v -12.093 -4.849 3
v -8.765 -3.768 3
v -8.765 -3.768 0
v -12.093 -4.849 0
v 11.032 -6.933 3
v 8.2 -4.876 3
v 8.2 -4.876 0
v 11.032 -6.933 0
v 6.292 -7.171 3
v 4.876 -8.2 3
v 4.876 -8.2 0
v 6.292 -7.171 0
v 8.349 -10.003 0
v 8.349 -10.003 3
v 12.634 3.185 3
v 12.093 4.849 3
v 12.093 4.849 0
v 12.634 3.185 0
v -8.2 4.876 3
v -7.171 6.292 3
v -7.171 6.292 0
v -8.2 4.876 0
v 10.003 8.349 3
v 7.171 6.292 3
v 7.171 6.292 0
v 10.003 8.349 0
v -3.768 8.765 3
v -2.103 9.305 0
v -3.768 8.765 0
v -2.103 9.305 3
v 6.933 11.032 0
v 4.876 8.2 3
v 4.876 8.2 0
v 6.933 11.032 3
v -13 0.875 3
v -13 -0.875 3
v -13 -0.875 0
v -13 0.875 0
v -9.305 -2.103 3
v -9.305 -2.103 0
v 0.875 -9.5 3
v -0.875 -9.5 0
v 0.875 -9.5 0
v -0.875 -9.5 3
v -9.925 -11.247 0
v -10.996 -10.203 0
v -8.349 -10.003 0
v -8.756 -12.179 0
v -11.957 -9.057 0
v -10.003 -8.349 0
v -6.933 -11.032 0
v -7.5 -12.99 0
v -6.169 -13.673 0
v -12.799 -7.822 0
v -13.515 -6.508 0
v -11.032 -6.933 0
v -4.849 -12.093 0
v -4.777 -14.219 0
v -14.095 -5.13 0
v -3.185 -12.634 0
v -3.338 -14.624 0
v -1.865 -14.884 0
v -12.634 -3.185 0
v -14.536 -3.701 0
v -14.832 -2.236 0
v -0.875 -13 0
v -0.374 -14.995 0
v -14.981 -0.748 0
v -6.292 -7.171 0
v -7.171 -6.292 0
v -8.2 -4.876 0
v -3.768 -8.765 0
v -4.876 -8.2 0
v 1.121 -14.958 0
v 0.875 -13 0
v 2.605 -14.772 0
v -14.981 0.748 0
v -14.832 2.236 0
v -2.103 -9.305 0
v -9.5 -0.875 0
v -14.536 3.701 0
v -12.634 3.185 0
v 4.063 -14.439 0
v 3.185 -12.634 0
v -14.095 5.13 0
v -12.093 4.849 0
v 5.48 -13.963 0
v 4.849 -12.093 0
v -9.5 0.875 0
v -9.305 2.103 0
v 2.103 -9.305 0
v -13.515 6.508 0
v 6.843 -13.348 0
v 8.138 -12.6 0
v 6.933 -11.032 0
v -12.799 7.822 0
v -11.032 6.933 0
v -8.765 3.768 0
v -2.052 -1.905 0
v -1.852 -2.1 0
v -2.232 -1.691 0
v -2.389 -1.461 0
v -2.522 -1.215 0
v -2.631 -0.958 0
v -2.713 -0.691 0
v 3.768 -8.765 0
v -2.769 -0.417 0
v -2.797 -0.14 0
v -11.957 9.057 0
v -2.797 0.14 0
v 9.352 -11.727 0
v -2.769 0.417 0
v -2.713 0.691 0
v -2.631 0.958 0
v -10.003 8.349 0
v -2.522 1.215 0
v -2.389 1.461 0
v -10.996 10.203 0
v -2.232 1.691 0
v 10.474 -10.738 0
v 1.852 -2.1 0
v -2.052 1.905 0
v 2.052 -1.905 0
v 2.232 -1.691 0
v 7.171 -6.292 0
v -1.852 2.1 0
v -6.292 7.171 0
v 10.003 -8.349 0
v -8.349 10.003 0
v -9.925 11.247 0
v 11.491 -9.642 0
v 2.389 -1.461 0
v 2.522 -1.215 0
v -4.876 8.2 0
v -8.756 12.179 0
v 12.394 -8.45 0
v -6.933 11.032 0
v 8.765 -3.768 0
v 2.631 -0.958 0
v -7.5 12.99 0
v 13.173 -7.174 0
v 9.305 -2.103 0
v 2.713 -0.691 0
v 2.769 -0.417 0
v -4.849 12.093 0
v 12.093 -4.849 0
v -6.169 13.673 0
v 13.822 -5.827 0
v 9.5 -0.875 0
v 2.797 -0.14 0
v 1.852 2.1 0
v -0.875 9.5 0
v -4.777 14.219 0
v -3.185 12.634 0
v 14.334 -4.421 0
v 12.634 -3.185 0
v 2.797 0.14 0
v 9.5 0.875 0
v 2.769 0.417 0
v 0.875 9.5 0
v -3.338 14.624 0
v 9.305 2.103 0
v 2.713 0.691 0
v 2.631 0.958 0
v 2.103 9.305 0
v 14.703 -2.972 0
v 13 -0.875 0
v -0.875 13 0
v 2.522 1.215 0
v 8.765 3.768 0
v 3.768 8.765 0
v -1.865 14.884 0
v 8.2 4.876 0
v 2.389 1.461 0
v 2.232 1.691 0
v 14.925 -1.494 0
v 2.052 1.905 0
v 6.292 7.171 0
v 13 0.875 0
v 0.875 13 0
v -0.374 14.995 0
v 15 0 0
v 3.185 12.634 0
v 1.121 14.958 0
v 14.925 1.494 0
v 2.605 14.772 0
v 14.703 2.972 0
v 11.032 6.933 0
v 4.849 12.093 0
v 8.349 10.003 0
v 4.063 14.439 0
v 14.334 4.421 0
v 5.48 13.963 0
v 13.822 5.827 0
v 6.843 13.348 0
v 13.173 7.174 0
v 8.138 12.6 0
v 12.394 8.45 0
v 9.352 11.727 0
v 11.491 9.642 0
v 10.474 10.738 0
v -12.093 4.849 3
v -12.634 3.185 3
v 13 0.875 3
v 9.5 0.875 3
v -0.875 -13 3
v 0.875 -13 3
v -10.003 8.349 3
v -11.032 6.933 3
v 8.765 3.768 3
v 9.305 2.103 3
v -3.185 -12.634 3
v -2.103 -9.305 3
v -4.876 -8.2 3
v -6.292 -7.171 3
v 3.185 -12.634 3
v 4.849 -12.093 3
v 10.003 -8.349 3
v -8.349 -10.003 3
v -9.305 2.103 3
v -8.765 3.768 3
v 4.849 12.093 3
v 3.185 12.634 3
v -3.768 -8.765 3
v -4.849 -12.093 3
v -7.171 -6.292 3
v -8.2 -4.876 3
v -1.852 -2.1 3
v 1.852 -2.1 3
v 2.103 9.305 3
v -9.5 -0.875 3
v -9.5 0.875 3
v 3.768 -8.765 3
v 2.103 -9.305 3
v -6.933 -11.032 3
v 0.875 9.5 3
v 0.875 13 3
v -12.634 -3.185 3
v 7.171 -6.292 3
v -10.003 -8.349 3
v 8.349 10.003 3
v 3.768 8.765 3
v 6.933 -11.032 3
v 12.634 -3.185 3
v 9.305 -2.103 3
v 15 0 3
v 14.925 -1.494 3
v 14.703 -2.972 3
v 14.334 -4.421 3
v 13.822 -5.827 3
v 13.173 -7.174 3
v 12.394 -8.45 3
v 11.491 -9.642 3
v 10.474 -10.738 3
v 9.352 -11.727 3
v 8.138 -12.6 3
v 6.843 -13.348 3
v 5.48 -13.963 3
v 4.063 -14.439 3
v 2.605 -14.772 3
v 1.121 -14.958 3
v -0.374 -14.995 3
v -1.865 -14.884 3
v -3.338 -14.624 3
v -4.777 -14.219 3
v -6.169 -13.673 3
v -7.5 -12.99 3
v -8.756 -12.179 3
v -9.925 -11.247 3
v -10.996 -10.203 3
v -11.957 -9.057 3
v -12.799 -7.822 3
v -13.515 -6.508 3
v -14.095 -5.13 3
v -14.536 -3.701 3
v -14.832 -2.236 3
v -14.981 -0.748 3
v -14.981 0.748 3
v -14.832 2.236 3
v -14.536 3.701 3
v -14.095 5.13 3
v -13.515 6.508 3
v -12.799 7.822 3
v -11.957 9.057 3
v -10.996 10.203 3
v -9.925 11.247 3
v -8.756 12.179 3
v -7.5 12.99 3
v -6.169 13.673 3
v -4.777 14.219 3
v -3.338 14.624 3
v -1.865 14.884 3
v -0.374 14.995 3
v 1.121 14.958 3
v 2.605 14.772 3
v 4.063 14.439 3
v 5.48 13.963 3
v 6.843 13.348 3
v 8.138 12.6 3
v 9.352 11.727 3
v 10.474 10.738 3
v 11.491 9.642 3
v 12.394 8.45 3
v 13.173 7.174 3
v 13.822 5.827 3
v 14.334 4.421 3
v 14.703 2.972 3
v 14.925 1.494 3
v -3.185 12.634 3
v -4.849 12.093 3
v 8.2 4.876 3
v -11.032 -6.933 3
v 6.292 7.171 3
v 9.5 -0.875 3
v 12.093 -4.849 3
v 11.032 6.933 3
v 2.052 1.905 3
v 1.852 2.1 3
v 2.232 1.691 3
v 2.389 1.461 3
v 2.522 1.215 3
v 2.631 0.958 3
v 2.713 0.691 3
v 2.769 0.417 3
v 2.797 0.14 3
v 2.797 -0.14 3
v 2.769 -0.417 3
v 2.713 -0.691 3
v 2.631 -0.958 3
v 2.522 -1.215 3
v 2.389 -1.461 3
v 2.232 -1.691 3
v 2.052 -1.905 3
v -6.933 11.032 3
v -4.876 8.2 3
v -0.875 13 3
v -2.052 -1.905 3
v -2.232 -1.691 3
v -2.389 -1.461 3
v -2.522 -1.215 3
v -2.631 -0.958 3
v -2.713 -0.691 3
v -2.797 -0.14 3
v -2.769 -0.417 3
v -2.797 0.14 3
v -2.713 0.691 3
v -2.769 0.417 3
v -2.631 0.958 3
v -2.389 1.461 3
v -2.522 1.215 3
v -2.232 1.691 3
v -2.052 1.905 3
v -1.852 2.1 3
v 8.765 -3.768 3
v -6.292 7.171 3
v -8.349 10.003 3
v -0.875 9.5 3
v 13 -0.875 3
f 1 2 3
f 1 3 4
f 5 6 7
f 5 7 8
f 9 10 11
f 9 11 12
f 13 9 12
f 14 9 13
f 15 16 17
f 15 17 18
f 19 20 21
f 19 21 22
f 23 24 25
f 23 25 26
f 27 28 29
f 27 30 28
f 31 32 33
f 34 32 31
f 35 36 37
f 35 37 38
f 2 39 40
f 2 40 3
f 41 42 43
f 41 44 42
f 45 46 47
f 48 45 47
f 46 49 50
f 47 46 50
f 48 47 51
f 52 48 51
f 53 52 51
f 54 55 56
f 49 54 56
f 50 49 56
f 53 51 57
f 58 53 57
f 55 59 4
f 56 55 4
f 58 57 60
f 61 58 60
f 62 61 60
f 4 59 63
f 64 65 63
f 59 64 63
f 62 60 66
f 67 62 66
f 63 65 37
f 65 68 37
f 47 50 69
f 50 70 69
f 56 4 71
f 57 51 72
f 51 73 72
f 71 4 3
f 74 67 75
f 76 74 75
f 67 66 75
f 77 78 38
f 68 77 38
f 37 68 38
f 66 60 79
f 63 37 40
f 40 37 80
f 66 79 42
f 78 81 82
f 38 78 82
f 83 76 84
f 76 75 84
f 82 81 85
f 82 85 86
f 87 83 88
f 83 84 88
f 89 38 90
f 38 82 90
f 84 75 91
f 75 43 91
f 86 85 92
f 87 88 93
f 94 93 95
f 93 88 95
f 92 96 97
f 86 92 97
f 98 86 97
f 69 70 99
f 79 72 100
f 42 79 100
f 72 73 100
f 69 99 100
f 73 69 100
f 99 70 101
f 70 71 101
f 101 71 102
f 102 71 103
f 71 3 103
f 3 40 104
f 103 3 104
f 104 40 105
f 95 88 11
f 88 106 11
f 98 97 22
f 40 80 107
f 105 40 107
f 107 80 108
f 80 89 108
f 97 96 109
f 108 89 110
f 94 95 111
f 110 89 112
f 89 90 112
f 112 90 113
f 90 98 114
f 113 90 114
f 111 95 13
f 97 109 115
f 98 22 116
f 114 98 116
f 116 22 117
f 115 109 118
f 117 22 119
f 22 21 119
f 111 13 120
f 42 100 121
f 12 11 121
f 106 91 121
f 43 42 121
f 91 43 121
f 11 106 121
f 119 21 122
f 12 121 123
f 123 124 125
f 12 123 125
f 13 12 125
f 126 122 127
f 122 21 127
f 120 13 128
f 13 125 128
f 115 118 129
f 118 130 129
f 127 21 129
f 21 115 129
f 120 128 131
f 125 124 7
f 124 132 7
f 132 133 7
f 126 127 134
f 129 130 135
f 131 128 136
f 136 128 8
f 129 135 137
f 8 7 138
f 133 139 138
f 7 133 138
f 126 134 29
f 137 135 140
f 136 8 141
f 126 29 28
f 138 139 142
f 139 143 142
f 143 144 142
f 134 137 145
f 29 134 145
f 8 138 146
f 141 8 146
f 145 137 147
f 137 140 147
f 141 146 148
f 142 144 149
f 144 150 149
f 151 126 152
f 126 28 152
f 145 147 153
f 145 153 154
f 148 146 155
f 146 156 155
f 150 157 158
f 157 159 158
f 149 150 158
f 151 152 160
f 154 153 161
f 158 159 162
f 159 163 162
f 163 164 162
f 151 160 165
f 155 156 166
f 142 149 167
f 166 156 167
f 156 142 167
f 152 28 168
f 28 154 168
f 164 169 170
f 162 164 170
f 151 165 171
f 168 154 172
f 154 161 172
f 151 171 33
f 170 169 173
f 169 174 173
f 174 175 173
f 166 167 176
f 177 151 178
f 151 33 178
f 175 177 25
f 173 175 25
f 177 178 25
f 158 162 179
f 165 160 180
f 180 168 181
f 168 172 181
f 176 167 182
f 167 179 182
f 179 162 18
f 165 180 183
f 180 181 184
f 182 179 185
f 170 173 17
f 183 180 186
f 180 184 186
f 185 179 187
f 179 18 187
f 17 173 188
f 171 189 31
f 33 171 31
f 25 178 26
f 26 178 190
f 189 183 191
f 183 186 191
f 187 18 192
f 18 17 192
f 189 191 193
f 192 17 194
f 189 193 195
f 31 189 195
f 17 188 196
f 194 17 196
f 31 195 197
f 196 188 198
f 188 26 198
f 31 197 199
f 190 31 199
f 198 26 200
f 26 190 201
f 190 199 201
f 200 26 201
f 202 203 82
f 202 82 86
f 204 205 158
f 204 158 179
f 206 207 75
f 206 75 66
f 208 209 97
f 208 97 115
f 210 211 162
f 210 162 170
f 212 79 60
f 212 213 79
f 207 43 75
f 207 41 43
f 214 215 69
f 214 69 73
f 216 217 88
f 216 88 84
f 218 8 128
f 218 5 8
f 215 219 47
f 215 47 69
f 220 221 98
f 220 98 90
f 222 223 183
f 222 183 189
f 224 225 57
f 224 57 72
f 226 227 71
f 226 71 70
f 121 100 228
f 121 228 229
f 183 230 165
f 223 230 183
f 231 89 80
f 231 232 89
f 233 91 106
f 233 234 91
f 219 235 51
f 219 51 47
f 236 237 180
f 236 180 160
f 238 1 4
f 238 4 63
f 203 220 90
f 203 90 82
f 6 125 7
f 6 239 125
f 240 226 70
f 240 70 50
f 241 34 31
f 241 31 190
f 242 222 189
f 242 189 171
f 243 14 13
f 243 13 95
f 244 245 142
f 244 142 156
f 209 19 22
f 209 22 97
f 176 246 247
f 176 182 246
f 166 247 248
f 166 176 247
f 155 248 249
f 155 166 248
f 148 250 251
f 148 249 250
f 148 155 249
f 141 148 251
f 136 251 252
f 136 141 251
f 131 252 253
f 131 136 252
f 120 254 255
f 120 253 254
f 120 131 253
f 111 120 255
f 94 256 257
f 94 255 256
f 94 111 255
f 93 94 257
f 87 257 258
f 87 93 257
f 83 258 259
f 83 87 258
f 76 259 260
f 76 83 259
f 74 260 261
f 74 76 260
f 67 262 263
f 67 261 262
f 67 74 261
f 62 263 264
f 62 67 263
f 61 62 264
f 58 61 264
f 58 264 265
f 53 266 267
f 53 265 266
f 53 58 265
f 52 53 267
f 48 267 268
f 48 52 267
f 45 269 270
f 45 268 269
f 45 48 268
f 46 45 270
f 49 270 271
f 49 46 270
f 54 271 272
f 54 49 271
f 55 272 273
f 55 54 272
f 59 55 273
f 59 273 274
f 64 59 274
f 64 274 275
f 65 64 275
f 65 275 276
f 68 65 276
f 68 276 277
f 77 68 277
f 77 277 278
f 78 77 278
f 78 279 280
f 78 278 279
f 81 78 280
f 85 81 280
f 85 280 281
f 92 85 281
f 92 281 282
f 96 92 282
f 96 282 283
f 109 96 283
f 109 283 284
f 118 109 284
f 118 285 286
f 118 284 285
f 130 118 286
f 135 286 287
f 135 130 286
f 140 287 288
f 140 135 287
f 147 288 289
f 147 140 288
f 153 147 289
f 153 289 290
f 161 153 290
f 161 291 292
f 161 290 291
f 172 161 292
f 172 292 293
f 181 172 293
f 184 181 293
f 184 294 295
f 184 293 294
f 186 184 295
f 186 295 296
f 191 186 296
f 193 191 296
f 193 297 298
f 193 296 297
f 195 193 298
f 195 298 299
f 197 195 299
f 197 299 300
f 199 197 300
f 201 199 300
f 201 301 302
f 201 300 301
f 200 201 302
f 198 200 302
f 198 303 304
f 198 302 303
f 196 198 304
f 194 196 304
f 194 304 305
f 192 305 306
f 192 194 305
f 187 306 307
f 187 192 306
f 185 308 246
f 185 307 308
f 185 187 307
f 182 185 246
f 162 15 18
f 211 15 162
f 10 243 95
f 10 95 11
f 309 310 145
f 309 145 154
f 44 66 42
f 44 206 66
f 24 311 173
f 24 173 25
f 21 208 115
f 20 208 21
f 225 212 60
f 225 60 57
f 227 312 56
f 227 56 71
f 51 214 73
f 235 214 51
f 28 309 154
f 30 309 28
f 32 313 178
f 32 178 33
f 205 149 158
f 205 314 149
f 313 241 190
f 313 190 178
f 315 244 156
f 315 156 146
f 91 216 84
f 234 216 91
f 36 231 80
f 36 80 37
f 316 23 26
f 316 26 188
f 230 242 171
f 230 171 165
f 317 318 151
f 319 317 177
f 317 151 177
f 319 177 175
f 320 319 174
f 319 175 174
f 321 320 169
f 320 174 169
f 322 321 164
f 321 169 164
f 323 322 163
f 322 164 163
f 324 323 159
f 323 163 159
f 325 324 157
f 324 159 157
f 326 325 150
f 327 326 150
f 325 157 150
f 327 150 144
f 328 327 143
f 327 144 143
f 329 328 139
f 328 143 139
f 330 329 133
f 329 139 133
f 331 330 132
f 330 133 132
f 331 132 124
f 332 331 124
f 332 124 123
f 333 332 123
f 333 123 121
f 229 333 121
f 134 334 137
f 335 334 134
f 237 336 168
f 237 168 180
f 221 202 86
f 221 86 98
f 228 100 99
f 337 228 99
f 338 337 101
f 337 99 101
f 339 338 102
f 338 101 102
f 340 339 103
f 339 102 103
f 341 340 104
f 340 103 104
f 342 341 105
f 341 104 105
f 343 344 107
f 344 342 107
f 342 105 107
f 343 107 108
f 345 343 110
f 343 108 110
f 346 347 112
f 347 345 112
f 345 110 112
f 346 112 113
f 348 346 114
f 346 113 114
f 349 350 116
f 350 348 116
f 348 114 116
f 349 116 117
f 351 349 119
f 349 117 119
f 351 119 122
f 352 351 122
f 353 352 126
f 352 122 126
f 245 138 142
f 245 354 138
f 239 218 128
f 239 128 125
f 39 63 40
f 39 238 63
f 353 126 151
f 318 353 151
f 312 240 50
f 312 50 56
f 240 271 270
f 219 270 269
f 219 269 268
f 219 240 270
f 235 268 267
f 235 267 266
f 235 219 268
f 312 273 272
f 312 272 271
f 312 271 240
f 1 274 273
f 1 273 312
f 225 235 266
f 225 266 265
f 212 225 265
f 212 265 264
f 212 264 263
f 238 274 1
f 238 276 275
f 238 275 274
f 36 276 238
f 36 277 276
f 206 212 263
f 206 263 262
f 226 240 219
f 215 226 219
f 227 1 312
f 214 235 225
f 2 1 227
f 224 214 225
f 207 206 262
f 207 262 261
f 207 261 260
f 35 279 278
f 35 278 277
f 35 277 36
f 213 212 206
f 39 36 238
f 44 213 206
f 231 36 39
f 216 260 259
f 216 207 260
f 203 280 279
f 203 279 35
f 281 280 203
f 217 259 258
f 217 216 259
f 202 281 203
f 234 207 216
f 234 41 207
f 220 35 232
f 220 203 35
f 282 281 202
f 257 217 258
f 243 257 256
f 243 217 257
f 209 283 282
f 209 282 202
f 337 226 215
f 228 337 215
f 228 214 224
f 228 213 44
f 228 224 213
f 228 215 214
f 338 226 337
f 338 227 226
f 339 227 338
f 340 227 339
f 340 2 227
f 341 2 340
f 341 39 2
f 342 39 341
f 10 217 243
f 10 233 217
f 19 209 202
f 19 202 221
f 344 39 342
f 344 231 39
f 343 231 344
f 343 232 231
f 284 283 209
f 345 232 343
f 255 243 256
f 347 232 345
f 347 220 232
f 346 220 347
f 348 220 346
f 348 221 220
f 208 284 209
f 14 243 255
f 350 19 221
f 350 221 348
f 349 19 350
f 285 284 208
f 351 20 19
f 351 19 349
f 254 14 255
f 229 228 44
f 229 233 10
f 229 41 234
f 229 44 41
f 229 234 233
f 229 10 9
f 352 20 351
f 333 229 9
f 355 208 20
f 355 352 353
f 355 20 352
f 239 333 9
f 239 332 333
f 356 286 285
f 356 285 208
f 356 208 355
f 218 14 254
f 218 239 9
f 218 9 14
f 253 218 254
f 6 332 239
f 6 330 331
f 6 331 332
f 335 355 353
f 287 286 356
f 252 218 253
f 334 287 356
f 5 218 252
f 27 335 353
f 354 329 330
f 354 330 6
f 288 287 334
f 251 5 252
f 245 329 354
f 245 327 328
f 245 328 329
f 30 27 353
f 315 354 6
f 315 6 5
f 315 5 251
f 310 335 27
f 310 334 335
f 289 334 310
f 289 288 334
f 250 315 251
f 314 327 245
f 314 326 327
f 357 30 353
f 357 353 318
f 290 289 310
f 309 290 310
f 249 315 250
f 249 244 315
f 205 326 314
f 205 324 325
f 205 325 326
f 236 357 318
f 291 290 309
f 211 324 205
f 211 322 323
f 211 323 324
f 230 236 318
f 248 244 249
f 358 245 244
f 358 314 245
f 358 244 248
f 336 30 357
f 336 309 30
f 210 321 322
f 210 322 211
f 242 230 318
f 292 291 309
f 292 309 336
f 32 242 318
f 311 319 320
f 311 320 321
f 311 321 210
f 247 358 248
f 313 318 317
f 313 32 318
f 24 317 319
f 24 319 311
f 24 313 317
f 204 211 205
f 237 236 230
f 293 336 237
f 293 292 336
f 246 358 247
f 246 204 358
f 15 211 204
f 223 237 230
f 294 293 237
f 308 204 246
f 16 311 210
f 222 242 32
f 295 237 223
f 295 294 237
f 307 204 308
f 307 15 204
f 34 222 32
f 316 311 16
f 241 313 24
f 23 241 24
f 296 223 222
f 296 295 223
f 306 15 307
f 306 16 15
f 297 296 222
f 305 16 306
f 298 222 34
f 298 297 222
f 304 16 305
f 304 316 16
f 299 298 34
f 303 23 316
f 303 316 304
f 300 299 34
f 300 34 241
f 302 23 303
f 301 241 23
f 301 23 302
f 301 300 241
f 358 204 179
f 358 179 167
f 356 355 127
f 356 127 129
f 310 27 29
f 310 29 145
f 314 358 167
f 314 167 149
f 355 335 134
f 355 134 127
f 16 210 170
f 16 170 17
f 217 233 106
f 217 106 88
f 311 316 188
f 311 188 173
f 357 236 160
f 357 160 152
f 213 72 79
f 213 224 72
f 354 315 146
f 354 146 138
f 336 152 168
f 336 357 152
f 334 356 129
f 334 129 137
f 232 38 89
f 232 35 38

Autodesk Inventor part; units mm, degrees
ref_plane "YZ Plane" through (0, 0, 0) normal (1, 0, 0) x (0, 1, 0)
ref_plane "XZ Plane" through (0, 0, 0) normal (0, 1, 0) x (-1, 0, 0)
ref_plane "XY Plane" through (0, 0, 0) normal (0, 0, 1) x (1, 0, 0)
sketch "Boceto1" plane through (0, 0, 0) normal (0, 0, 1) x (1, 0, 0)
  circle A0 centre (0, 0) radius 15
  circle A1 centre (0, 0) radius 2.8
  line L0 (-1.852, 2.1) -> (1.852, 2.1)
  line L1 (-1.852, -2.1) -> (1.852, -2.1)
  dimension "d0" = 30
  dimension "d1" = 5.6
  dimension "d2" = 2.1
  dimension "d3" = 2.1
extrude "Extrusión1" add sketch "Boceto1" along normal blind 3 contours A0 | L0 A1 | A1 L1
sketch "Boceto2" plane through (0, 0, 3) normal (0, 0, 1) x (1, 0, 0)
  line L0 (-0.875, 13) -> (0.875, 13)
  line L1 (0.875, 13) -> (0.875, 9.5)
  line L2 (0.875, 9.5) -> (-0.875, 9.5)
  line L3 (-0.875, 9.5) -> (-0.875, 13)
  point P0 (0, 0)
  point P1 (0, 13)
  dimension "d6" = 3.5
  dimension "d7" = 1.75
  dimension "d8" = 9.5
extrude "Extrusión2" cut sketch "Boceto2" against normal through all
pattern_circular "Patrón circular1" count 20 over 360 about axis through (0, 0, -10) along (0, 0, 1) of "Extrusión2"
properties part number "Disco_encoder"
